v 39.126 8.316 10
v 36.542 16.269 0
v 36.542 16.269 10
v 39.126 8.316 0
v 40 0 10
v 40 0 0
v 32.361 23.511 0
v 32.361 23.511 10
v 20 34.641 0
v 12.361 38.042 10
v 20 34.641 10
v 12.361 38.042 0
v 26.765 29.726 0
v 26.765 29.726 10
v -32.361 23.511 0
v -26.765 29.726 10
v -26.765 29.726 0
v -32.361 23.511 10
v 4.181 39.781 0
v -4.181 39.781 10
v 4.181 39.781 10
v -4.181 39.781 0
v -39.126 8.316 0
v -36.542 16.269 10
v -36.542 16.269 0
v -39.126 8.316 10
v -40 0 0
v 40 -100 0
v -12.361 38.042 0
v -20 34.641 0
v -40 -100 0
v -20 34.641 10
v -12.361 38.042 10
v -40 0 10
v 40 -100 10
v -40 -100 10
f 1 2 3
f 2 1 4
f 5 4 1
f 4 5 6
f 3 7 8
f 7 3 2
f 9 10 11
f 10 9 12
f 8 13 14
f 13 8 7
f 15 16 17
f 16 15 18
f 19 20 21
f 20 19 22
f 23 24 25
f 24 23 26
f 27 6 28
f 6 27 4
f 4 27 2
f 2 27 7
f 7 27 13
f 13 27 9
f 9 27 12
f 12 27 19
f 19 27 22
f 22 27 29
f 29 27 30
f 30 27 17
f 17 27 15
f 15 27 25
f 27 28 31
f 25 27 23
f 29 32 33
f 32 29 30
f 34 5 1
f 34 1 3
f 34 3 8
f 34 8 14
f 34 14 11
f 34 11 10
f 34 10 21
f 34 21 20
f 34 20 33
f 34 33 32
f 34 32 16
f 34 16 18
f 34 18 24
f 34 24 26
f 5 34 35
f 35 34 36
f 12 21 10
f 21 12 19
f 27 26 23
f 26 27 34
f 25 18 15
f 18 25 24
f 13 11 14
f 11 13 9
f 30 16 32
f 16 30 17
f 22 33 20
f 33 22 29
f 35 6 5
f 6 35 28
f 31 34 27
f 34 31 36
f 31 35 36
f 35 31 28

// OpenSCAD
scale([2, 2, 2]) difference() {
	union() {
		cylinder (r=20, h=5);
		translate ([0, -25, 2.5]) cube ([40, 50, 5], center=true);
	}
	# translate([-17.5, -15, 2.5]) scale([.5,.5,1]) linear_extrude(file = "/Users/bryanduxbury/Desktop/graph_api.dxf", height=3);	
}
